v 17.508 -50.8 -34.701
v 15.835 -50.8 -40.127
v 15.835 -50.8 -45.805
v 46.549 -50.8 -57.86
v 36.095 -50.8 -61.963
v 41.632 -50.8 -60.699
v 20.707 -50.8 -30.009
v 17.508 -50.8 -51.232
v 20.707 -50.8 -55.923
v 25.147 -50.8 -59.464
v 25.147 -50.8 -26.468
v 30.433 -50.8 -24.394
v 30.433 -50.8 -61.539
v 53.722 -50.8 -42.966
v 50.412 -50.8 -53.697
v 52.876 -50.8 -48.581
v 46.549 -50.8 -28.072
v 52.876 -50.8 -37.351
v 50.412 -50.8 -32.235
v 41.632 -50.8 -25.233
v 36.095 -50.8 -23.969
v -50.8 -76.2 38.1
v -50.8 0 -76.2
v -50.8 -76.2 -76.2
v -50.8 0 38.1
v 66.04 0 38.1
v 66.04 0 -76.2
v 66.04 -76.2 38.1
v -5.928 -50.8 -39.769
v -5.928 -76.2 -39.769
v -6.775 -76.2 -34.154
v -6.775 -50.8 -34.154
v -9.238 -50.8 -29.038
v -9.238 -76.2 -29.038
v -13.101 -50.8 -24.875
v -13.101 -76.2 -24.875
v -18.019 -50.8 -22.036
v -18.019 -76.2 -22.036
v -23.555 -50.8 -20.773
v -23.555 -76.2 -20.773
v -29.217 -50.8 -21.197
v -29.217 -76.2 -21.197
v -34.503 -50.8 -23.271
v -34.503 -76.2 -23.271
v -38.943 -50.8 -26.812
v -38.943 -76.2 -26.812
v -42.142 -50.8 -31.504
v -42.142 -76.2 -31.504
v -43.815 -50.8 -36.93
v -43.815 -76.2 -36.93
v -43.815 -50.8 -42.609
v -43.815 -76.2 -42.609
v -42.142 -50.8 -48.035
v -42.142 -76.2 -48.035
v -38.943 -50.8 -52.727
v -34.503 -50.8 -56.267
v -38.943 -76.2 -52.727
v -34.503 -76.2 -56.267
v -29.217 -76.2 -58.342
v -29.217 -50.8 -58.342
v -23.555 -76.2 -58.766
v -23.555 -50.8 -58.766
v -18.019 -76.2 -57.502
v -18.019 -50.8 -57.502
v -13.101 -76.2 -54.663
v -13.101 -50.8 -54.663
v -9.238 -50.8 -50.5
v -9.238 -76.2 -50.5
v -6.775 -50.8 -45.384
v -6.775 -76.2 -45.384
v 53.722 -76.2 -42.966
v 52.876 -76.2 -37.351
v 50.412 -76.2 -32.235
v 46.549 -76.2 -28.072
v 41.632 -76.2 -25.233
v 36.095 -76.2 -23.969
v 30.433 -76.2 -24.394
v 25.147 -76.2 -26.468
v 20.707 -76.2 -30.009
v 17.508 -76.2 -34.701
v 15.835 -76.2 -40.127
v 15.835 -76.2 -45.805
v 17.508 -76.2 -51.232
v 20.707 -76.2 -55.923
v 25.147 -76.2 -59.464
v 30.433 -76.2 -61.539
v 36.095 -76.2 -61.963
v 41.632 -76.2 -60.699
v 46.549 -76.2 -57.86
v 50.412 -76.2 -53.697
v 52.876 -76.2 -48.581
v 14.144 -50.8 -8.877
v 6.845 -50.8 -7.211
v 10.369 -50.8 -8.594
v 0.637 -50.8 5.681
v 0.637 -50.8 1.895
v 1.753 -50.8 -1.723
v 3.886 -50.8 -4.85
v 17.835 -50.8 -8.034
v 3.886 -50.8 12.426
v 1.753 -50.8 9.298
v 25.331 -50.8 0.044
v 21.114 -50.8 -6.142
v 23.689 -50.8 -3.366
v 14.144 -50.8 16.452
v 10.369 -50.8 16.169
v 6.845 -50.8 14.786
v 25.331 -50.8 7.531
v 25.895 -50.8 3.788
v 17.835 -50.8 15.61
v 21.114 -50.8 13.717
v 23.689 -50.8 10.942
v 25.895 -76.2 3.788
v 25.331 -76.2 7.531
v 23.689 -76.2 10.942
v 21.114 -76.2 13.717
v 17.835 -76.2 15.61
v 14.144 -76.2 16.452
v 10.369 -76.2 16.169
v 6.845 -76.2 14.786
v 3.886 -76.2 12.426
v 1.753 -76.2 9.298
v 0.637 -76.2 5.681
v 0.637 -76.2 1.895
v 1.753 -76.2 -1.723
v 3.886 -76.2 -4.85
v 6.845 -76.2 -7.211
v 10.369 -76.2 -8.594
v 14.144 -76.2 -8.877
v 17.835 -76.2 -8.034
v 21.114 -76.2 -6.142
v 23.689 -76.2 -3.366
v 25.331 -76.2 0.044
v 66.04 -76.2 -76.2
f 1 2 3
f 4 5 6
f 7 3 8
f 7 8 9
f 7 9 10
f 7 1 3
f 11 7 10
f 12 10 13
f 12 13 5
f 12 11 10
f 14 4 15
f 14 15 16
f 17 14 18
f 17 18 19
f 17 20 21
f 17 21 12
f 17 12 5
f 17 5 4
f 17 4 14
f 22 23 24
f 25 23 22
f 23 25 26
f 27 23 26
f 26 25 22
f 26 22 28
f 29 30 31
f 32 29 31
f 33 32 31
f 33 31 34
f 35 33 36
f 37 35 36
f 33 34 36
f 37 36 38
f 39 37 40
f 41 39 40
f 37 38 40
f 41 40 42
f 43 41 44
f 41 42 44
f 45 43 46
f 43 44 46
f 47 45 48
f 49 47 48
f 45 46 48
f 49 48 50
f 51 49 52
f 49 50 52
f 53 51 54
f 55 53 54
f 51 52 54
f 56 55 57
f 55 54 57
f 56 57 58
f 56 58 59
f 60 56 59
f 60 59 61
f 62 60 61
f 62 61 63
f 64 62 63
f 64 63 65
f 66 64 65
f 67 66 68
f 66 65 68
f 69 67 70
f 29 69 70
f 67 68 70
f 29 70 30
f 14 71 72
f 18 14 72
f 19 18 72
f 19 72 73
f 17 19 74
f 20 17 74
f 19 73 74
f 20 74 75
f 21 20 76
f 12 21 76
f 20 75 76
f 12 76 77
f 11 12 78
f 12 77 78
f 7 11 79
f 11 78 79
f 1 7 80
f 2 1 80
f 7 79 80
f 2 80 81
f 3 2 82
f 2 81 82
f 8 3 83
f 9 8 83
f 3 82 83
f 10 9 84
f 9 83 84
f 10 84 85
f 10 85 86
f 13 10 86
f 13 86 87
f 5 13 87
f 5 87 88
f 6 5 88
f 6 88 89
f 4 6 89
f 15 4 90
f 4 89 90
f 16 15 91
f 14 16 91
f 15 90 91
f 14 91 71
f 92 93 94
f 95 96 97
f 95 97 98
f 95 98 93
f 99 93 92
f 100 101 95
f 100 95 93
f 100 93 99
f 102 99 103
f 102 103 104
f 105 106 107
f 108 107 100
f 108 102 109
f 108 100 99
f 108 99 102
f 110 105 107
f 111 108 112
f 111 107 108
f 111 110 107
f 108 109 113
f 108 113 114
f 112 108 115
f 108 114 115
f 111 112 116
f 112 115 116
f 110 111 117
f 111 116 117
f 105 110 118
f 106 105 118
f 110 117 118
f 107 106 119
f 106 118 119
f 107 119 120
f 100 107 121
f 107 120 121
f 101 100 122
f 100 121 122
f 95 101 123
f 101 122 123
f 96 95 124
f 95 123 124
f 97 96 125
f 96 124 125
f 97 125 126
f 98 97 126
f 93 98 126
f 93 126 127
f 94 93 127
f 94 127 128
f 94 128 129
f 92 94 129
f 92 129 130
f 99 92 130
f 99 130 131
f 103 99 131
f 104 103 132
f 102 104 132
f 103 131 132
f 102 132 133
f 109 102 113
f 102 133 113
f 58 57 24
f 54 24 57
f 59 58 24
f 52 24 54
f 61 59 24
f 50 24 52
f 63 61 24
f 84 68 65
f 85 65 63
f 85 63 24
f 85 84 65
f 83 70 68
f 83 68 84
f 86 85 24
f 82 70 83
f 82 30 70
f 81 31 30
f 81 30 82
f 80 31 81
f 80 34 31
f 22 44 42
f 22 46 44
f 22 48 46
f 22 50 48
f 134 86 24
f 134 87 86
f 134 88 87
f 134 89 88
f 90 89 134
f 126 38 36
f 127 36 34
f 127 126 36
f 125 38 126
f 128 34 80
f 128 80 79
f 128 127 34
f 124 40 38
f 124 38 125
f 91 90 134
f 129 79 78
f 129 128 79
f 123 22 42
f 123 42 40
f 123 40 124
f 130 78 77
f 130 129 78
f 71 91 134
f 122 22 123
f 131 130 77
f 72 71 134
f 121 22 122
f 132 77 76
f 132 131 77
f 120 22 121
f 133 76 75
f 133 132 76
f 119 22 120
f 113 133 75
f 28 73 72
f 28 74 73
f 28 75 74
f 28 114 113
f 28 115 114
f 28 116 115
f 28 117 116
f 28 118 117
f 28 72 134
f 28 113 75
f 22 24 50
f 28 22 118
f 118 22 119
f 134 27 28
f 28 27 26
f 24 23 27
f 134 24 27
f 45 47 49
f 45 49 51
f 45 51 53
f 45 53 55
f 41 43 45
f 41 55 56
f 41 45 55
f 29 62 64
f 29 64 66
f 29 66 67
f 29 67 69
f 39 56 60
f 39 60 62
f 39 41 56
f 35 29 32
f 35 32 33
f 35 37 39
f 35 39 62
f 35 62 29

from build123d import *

# Parameters (mm, degrees)
F0_W     = 116.84
F0_H     = 114.3
F1_DEPTH = 76.2
F2_R     = 12.7
F2_R_2   = 19.05
F3_DEPTH = 25.4


with BuildPart() as f1:
    # F0 (on Front) → F1 (new body)
    with BuildSketch(Plane.XZ):
        with Locations((7.62, -19.05)):
            Rectangle(F0_W, F0_H)
    extrude(amount=F1_DEPTH)

    # F2 (on face) → F3 (cut)
    with BuildSketch(Plane.XZ.offset(76.2)):
        with Locations((13.195288, 3.787711)):
            Circle(F2_R)
        with Locations((34.671844, -42.966176)):
            Circle(F2_R_2)
        with Locations((-24.978266, -39.769248)):
            Circle(F2_R_2)
    extrude(amount=-F3_DEPTH, mode=Mode.SUBTRACT)


solid = f1.part
